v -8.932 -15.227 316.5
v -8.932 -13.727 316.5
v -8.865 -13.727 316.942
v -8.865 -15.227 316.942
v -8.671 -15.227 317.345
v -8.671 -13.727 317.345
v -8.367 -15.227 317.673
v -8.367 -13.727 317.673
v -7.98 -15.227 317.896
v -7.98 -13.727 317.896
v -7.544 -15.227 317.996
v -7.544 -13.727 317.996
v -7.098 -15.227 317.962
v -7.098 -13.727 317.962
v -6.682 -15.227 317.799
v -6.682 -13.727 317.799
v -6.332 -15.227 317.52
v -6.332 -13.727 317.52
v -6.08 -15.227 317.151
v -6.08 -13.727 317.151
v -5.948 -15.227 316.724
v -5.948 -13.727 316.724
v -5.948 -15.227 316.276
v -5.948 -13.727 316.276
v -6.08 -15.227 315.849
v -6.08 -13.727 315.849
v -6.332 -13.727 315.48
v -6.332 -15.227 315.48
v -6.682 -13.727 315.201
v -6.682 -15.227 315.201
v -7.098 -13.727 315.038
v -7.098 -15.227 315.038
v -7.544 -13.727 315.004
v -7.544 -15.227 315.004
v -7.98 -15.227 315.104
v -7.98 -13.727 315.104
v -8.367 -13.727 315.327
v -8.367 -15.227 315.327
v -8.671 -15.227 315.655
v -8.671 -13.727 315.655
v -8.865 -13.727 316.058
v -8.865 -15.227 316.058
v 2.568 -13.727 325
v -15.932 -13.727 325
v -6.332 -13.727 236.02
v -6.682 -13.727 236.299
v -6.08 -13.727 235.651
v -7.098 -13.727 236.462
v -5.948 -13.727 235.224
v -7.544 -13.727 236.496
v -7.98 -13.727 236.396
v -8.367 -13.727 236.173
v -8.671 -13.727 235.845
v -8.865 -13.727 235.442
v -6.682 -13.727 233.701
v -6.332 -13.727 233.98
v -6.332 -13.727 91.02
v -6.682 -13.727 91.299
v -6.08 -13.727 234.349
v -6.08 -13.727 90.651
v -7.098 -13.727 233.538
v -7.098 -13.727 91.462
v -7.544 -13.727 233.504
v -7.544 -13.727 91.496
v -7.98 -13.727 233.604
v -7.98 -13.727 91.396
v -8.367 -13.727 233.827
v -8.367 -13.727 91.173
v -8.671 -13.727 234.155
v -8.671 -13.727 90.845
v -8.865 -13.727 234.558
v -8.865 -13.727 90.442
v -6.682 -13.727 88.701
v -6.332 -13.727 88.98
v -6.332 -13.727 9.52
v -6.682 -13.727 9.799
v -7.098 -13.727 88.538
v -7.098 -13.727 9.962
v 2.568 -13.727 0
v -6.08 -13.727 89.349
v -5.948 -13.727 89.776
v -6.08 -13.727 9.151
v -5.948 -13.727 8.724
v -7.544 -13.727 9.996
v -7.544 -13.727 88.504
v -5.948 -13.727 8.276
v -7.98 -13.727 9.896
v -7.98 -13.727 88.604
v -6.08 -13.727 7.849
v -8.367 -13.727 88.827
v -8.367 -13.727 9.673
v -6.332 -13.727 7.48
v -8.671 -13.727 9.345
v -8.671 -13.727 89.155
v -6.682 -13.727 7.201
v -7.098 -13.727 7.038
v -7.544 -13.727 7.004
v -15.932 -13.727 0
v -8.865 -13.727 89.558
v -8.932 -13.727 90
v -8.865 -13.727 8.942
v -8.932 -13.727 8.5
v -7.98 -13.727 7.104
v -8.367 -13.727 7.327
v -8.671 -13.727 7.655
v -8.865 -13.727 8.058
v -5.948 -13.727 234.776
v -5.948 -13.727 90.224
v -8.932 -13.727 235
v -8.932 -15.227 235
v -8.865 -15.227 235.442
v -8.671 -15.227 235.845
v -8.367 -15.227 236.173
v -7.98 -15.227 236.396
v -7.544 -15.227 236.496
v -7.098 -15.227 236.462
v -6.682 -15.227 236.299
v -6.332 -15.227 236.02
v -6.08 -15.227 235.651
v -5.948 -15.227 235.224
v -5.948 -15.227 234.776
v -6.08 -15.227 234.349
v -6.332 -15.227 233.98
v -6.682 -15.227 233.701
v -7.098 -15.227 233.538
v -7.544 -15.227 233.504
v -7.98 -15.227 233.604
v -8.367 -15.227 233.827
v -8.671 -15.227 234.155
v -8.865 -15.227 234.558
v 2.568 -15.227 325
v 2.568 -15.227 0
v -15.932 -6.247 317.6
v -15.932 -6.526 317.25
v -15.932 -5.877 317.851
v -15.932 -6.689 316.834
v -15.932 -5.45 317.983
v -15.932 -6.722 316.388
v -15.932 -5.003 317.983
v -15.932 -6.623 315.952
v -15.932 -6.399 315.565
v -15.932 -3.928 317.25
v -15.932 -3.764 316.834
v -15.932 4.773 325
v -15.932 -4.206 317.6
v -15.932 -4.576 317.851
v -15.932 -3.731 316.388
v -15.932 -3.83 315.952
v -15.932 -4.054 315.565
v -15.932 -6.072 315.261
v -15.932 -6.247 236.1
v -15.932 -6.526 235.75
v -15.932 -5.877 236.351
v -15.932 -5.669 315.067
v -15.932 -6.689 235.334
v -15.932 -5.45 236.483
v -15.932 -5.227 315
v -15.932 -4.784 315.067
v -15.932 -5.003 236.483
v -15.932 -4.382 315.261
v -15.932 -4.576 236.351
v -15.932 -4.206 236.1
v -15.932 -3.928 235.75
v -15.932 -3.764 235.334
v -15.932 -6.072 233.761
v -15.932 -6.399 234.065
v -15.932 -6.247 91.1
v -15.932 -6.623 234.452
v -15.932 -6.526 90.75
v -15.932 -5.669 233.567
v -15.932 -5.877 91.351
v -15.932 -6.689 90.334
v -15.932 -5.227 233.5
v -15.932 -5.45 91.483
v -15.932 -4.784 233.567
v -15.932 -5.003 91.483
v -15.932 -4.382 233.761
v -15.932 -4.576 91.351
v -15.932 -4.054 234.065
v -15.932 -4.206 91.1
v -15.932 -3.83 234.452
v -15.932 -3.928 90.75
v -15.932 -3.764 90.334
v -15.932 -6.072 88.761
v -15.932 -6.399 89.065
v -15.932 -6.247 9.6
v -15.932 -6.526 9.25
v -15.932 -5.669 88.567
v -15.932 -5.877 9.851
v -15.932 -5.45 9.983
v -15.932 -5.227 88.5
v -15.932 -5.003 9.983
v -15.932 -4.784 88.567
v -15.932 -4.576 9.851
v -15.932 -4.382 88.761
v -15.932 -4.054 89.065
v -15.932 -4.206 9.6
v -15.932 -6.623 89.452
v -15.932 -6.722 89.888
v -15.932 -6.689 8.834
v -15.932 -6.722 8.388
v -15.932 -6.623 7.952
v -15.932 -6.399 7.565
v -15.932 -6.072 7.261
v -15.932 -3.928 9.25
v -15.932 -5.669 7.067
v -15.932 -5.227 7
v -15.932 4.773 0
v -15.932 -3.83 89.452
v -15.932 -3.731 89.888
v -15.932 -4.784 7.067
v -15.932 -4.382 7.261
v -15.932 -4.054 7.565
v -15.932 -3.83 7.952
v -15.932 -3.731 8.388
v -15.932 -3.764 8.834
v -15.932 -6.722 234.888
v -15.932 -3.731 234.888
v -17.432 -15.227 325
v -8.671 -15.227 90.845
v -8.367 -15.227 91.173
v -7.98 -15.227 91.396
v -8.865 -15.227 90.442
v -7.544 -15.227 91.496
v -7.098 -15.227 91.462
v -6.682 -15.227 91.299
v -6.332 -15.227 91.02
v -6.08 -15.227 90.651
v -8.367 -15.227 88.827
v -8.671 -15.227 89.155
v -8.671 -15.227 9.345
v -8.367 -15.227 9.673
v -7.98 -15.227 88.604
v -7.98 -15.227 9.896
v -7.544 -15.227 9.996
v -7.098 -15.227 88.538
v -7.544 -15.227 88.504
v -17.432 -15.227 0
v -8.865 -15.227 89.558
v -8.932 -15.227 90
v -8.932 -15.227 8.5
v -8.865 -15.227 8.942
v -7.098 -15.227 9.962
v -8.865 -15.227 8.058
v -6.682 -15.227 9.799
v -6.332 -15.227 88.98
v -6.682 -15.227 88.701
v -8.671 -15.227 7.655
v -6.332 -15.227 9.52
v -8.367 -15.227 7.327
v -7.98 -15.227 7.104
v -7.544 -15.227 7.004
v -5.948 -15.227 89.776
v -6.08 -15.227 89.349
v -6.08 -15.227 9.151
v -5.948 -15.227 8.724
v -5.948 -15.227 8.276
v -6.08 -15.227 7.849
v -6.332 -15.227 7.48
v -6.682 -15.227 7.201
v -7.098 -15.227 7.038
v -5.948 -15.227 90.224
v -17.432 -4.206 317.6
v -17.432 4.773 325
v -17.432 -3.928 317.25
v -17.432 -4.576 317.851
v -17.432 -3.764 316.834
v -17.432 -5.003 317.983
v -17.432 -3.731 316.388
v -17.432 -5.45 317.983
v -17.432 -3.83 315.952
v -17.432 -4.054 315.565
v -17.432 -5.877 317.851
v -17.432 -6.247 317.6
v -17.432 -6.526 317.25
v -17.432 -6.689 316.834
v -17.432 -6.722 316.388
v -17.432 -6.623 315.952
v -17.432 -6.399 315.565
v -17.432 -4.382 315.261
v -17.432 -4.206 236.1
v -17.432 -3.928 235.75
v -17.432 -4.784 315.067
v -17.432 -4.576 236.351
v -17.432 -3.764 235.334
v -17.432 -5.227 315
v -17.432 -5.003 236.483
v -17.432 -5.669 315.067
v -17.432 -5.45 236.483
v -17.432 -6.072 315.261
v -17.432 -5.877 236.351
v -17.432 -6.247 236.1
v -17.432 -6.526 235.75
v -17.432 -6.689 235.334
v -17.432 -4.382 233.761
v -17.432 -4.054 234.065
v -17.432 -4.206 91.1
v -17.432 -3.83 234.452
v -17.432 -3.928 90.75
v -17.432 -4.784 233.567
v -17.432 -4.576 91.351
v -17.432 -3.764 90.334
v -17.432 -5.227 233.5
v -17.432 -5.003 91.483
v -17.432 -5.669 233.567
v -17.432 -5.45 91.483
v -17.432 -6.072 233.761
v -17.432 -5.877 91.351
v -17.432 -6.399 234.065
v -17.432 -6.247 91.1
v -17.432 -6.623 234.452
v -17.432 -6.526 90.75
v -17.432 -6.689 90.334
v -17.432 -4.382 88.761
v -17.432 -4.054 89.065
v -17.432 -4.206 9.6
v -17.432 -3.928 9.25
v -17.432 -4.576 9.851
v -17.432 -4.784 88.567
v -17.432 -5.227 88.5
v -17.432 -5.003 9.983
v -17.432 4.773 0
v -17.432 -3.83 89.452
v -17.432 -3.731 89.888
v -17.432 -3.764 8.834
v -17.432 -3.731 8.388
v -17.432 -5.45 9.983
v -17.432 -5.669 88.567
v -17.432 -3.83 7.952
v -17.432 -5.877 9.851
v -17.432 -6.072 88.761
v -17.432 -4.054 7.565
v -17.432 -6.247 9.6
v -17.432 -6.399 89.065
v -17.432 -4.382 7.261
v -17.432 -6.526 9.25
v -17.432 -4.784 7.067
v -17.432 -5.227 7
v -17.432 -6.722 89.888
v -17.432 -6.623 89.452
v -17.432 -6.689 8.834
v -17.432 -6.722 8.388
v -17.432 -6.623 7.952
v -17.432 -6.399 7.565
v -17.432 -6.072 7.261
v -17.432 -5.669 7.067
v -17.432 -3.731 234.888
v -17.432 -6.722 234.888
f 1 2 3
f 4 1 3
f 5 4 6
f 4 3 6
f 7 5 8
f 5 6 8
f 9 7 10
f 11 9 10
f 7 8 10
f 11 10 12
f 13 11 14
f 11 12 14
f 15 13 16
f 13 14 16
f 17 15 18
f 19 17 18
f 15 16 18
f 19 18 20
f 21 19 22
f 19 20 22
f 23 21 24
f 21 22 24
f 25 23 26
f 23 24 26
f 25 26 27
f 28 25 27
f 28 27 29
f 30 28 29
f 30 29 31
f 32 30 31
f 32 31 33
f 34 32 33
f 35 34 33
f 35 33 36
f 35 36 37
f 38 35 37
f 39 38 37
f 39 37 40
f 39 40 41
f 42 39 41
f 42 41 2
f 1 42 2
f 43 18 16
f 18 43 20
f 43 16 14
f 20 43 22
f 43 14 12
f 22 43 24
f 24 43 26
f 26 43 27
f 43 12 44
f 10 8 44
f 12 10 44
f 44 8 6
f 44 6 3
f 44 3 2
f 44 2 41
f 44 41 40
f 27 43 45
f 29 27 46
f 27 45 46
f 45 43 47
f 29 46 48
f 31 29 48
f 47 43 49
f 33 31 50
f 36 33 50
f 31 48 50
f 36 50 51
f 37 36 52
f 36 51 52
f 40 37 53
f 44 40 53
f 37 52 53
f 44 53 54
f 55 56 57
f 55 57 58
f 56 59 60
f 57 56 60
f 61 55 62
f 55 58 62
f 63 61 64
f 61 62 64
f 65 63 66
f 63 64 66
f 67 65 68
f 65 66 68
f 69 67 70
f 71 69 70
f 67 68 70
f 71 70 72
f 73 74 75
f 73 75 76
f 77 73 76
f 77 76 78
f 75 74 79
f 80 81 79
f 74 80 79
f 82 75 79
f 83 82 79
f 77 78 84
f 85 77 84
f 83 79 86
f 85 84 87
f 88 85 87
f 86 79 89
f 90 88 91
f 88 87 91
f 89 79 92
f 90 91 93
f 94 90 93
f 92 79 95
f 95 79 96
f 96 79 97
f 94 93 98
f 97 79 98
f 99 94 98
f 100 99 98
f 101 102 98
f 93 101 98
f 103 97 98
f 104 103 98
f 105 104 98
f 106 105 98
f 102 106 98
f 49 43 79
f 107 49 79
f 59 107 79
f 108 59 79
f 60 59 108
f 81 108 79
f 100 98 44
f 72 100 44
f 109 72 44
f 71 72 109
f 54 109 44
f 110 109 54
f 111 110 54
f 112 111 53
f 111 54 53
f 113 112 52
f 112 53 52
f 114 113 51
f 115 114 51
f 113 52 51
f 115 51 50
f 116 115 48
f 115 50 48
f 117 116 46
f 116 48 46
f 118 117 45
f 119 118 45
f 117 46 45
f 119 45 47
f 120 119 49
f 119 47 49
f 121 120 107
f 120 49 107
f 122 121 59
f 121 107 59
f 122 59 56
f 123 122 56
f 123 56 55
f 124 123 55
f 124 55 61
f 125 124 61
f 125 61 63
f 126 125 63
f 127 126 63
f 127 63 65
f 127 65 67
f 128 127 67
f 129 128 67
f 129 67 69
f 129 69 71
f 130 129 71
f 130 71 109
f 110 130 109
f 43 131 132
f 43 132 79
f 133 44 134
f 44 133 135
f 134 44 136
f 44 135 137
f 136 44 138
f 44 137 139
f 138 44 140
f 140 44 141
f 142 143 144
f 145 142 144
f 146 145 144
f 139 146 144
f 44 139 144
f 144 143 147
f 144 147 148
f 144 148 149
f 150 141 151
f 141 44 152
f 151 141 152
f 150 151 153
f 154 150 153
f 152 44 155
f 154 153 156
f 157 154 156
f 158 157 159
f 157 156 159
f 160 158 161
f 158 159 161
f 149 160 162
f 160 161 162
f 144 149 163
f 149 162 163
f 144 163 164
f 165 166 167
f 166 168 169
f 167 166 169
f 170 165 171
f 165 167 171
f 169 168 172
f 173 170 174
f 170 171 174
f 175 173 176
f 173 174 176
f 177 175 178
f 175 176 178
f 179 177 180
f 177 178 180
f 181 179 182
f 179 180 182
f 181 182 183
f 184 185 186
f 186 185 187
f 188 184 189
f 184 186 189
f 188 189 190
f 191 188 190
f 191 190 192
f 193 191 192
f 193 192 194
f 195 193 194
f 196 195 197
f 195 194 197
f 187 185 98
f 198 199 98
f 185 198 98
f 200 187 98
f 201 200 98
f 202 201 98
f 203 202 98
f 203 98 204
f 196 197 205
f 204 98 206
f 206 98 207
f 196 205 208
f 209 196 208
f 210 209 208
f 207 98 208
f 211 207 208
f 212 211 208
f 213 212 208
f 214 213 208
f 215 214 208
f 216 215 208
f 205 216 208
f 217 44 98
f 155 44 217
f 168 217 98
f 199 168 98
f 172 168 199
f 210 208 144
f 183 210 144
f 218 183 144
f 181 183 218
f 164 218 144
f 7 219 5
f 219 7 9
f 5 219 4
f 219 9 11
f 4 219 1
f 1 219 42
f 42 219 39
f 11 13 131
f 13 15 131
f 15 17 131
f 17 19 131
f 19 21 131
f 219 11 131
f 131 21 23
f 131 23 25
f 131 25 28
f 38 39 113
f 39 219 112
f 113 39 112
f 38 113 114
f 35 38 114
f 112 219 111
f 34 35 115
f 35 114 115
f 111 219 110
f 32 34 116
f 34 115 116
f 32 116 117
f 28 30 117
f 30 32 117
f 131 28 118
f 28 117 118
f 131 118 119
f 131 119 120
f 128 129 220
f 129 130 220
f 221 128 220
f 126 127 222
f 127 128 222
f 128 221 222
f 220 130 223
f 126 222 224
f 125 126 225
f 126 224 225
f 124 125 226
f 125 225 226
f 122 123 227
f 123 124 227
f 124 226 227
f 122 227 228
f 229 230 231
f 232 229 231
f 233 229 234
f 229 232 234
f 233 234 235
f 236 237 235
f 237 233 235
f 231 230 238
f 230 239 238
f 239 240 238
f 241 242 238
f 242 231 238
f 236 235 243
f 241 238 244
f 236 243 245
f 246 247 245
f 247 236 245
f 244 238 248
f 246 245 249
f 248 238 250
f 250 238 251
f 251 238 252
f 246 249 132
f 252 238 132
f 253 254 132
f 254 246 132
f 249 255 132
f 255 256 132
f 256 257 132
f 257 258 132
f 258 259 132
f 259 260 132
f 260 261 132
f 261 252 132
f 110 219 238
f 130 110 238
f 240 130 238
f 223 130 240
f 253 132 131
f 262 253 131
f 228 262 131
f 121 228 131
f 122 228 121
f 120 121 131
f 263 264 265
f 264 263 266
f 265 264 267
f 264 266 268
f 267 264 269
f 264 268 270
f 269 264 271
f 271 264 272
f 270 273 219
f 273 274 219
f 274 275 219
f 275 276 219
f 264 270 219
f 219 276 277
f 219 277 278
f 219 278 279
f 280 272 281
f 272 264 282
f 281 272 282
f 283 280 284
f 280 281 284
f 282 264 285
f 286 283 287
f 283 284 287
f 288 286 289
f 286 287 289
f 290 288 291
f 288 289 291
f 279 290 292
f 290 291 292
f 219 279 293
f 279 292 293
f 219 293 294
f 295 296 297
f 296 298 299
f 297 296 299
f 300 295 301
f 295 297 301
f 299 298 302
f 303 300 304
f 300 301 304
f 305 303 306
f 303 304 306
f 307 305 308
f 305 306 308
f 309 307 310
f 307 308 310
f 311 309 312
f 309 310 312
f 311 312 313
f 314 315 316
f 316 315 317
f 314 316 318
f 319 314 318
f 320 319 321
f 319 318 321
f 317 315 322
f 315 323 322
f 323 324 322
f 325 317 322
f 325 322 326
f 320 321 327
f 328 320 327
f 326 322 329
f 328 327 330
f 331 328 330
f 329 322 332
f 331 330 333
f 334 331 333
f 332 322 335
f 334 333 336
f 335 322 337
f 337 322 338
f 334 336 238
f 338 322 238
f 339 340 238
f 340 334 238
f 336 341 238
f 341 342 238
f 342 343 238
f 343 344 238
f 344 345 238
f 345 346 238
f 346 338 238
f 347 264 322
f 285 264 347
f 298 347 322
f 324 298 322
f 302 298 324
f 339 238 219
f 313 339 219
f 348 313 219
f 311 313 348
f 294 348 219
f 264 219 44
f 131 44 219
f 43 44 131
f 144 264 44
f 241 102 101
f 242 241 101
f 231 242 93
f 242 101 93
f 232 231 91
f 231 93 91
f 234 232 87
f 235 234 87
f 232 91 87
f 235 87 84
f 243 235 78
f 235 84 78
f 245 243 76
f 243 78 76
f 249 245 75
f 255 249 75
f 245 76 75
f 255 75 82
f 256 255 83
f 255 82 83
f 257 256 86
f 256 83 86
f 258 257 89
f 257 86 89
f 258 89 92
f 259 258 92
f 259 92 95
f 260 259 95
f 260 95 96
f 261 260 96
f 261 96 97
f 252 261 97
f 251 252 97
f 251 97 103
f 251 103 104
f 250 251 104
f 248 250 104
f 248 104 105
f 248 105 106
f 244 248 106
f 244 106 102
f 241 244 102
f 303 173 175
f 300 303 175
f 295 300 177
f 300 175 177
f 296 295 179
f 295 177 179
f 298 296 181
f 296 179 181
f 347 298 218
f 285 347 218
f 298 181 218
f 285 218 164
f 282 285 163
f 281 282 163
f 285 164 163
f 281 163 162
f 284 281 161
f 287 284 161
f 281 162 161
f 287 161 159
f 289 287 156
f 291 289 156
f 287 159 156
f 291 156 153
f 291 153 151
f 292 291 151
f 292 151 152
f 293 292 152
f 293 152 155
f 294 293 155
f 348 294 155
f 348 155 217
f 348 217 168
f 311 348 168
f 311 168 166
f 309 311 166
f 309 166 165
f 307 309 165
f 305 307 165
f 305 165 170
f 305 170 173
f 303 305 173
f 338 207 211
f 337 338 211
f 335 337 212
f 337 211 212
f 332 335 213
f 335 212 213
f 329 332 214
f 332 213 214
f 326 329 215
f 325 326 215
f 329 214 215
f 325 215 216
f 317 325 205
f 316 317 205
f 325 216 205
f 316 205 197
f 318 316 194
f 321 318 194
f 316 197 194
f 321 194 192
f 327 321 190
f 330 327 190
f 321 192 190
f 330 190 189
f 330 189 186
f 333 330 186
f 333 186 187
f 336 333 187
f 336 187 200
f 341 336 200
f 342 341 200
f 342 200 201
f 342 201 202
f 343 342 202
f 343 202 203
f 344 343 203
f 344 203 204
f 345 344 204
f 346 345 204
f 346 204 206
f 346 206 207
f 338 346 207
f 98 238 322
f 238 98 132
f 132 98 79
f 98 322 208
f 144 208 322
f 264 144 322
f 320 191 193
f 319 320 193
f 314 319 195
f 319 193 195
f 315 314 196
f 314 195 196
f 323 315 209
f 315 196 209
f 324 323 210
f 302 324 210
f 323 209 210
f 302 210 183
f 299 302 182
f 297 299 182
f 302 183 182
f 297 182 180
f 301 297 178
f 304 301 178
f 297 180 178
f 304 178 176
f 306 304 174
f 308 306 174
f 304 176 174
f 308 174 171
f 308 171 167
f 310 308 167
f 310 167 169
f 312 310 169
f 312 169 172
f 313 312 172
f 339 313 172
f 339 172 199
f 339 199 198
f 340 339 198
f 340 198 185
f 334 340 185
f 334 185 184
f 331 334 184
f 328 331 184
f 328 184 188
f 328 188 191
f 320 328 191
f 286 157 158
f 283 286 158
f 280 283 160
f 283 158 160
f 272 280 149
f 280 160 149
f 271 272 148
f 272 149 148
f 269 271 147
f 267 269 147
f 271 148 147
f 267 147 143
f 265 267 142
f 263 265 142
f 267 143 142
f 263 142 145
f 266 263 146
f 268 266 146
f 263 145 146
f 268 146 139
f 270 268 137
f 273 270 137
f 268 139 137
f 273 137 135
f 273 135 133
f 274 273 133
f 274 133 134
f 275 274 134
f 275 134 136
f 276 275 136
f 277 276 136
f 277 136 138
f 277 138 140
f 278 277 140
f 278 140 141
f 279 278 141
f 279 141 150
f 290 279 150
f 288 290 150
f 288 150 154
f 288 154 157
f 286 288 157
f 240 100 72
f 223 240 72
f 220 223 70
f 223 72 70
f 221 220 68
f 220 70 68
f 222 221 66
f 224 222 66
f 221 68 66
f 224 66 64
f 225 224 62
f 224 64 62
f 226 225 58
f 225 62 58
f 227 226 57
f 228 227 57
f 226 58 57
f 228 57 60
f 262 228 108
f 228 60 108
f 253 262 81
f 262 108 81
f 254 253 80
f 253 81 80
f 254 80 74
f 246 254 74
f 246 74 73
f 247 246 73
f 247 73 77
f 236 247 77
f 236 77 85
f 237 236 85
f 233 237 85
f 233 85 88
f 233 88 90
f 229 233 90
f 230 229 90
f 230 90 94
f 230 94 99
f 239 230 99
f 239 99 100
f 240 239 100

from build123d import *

# Parameters (mm, degrees)
EXTRUSION1_DEPTH = 325
ESQUISSE2_R      = 1.5
EXTRUSION2_DEPTH = 300
ESQUISSE3_R      = 1.5
EXTRUSION3_DEPTH = 300


with BuildPart() as part:
    # Esquisse1 → Extrusion1 (new body)
    with BuildSketch(Plane.XY):
        Polygon((-17.43168638, 4.773368421), (-17.43168638, -15.226631579), (2.56831362, -15.226631579), (2.56831362, -13.726631579), (-15.93168638, -13.726631579), (-15.93168638, 4.773368421), align=None)
    extrude(amount=EXTRUSION1_DEPTH)

    # Esquisse2 → Extrusion2 (cut)
    with BuildSketch(Plane(origin=(0, -13.726631579, 0), x_dir=(-1, 0, 0), z_dir=(0, 1, 0))):
        with Locations((7.43168638, 8.5)):
            Circle(ESQUISSE2_R)
        with Locations((7.43168638, 316.5)):
            Circle(ESQUISSE2_R)
        with Locations((7.43168638, 235)):
            Circle(ESQUISSE2_R)
        with Locations((7.43168638, 90)):
            Circle(ESQUISSE2_R)
    extrude(amount=-EXTRUSION2_DEPTH, mode=Mode.SUBTRACT)

    # Esquisse3 → Extrusion3 (cut)
    with BuildSketch(Plane(origin=(-15.93168638, 0, 0), x_dir=(0, 0, -1), z_dir=(1, 0, 0))):
        with Locations((-316.5, -5.226631579)):
            Circle(ESQUISSE3_R)
        with Locations((-8.5, -5.226631579)):
            Circle(ESQUISSE3_R)
        with Locations((-235, -5.226631579)):
            Circle(ESQUISSE3_R)
        with Locations((-90, -5.226631579)):
            Circle(ESQUISSE3_R)
    extrude(amount=-EXTRUSION3_DEPTH, mode=Mode.SUBTRACT)


solid = part.part
